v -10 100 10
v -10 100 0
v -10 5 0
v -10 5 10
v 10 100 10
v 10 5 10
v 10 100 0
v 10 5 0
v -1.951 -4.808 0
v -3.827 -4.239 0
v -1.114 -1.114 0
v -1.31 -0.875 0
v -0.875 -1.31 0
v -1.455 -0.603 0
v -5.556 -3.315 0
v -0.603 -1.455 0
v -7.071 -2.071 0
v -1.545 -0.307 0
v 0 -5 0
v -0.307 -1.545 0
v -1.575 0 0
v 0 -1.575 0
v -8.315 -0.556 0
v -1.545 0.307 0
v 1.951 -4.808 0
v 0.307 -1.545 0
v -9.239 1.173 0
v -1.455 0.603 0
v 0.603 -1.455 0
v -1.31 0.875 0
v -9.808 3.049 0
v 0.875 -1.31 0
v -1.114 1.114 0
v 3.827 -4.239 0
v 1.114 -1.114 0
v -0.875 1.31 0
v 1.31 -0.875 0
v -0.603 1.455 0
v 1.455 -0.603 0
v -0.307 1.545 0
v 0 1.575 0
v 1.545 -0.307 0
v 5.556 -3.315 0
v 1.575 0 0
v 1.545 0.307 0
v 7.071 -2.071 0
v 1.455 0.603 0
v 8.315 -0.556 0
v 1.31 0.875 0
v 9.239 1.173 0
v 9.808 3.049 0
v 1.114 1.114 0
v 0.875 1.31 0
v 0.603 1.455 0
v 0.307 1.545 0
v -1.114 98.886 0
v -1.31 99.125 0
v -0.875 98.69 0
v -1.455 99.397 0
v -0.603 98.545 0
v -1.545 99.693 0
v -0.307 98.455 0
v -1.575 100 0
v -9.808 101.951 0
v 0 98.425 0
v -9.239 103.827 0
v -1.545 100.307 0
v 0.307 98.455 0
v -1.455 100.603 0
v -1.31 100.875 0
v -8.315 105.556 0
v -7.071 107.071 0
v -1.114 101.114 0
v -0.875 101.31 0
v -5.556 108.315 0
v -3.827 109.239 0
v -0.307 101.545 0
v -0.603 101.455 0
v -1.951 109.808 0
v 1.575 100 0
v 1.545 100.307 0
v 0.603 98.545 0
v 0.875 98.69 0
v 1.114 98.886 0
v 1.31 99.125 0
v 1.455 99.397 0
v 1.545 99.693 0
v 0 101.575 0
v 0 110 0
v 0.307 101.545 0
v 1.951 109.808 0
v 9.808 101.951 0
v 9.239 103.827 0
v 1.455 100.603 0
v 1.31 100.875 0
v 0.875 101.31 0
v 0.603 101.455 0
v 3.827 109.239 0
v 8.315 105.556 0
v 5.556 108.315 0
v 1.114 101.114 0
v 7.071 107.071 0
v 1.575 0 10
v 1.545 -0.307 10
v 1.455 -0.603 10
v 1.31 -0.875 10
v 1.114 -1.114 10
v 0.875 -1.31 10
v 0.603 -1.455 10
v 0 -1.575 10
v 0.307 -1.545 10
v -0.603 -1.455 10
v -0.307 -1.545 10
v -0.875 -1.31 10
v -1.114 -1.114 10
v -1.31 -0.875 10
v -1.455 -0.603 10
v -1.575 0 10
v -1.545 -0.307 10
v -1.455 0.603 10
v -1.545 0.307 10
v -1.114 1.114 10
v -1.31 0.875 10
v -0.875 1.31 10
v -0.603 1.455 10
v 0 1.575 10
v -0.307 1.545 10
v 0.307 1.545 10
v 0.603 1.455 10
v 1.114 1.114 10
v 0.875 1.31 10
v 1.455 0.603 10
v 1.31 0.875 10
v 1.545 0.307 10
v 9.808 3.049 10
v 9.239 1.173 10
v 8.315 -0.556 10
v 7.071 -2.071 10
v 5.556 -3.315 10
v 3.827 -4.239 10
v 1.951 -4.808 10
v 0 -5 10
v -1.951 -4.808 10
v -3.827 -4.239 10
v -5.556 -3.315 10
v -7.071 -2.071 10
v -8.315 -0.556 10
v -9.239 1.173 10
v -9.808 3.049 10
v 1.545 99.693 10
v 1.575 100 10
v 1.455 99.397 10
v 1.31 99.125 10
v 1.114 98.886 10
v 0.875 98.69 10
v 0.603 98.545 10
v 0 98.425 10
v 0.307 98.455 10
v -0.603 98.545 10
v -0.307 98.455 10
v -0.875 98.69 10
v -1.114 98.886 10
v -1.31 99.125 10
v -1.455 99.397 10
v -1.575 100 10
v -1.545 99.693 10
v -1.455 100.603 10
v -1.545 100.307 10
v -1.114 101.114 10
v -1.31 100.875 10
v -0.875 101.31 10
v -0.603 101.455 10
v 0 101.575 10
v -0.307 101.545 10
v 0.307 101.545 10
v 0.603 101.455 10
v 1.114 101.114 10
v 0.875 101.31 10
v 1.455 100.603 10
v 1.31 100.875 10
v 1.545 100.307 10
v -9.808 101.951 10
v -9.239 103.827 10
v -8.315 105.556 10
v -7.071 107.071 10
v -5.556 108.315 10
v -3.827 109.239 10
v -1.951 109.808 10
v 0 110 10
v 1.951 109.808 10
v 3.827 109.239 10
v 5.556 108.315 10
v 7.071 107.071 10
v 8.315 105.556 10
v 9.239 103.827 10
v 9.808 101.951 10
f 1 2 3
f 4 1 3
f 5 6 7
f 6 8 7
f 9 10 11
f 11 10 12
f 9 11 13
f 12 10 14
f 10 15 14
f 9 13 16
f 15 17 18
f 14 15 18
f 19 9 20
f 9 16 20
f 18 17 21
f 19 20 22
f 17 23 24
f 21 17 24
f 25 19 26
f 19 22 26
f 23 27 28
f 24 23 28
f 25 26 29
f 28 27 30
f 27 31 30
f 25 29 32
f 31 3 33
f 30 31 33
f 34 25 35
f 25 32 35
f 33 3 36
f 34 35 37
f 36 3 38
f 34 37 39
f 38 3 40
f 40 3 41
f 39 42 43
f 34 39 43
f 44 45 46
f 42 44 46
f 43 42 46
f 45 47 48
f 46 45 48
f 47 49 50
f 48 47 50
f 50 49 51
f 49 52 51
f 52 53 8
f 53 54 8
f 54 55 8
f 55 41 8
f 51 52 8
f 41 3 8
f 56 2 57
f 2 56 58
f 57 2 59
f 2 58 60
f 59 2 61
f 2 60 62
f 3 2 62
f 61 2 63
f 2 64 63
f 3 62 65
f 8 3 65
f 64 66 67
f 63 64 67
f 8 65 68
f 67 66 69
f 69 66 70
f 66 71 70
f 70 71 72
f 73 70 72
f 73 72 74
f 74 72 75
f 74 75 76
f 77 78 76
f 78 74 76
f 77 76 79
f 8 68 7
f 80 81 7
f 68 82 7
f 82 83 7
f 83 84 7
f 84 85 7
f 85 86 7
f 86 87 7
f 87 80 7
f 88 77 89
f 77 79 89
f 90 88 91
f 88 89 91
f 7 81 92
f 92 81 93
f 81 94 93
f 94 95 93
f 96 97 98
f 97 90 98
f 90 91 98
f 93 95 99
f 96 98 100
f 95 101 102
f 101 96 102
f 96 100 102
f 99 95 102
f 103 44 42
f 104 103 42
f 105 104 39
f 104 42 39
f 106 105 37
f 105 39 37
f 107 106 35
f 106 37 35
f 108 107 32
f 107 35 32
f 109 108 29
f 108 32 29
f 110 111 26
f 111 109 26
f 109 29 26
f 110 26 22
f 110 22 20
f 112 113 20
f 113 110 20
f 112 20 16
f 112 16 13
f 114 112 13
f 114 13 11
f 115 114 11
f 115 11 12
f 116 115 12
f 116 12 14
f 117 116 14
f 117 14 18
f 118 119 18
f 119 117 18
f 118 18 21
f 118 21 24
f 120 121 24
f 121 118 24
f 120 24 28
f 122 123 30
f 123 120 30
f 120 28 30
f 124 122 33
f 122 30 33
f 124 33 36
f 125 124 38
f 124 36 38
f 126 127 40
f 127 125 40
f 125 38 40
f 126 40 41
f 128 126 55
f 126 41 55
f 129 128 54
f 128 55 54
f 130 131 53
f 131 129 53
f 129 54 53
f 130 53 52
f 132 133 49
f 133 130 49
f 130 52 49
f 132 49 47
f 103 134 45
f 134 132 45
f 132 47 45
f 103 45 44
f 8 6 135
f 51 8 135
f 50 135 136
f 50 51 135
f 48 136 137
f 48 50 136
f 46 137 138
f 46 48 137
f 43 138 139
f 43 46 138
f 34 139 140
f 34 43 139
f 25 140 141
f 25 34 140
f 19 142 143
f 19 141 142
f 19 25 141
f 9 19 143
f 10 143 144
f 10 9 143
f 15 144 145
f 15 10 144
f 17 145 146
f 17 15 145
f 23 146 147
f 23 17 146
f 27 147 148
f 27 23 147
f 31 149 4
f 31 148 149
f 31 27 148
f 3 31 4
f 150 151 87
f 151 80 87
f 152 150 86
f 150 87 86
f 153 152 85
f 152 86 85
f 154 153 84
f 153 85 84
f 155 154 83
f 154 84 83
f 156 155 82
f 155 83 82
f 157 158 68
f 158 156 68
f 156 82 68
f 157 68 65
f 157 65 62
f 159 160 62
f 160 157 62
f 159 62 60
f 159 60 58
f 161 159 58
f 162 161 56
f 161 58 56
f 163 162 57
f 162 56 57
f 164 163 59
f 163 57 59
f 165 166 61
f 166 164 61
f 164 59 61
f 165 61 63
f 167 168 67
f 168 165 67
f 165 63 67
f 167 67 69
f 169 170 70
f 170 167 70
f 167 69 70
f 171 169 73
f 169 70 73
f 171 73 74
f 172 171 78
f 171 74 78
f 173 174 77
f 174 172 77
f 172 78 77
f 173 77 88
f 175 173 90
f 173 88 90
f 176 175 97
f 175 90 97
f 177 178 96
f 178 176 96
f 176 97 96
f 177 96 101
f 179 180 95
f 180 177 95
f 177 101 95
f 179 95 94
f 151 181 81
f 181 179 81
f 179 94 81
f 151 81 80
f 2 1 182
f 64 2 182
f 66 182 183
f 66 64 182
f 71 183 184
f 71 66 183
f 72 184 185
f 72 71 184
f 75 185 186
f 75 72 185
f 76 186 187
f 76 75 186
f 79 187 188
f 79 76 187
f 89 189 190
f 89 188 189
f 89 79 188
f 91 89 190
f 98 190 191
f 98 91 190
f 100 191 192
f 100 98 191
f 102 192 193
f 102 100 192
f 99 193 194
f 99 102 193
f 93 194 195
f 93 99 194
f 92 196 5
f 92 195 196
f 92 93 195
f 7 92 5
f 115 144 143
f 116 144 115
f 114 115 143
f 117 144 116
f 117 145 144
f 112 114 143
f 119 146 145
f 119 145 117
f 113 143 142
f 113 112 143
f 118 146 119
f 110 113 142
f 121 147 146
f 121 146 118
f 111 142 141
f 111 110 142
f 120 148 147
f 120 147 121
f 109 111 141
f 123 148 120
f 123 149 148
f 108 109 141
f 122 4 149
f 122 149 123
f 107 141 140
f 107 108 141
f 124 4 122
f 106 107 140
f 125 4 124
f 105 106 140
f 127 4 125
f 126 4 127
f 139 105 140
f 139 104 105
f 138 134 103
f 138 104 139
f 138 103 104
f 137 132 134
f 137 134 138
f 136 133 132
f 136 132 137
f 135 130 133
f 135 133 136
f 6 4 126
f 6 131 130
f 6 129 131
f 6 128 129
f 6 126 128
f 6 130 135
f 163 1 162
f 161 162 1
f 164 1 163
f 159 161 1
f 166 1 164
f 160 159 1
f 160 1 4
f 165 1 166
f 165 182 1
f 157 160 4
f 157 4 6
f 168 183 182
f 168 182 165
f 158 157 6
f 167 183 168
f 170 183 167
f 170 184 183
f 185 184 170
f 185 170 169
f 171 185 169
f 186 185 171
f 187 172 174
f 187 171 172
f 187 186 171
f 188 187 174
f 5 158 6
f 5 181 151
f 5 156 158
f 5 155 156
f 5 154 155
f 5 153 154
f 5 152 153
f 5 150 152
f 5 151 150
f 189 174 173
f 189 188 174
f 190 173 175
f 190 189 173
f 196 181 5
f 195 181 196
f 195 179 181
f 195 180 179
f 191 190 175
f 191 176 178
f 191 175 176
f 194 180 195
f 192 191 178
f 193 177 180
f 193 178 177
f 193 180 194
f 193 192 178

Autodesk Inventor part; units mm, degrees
ref_plane "YZ Plane" through (0, 0, 0) normal (1, 0, 0) x (0, 1, 0)
ref_plane "XZ Plane" through (0, 0, 0) normal (0, 1, 0) x (-1, 0, 0)
ref_plane "XY Plane" through (0, 0, 0) normal (0, 0, 1) x (1, 0, 0)
sketch "Эскиз1" plane through (0, 0, 0) normal (0, 0, 1) x (1, 0, 0)
  circle A0 centre (0, 0) radius 5 construction
  circle A1 centre (0, 0) radius 1.575 projected
  line L0 (343.1024, 82) -> (-136.8976, 82) construction
  line L1 (0, -5) -> (0, 110) construction
  line L2 (10, 5) -> (10, 100)
  line L3 (-10, 100) -> (-10, 5)
  arc A2 (-10, 5) -> (10, 5) centre (0, 5) ccw
  arc A3 (10, 100) -> (-10, 100) centre (0, 100) ccw
  circle A4 centre (0, 100) radius 1.575
  point P0 (0, 0)
  point P1 (0, 52.5)
  dimension "d0" = 115
  dimension "d1" = 20
extrude "Выдавливание1" add sketch "Эскиз1" along normal blind 10
properties part number "шатун"
